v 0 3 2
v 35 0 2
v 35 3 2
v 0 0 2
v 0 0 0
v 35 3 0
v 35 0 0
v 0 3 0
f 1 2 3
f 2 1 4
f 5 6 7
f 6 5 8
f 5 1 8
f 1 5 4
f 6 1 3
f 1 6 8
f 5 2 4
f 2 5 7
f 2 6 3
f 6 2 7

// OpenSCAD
translate([2.5, 1.5, 1.0]) color([0.4049341374504143, 0.7837985890347726, 0.30331272607892745]) cube([5, 3, 2], center=true);
translate([7.5, 1.5, 1.0]) color([0.4765969541523558, 0.5833820394550312, 0.9081128851953352]) cube([5, 3, 2], center=true);
translate([12.5, 1.5, 1.0]) color([0.5046868558173903, 0.28183784439970383, 0.7558042041572239]) cube([5, 3, 2], center=true);
translate([17.5, 1.5, 1.0]) color([0.6183689966753316, 0.25050634136244054, 0.9097462559682401]) cube([5, 3, 2], center=true);
translate([22.5, 1.5, 1.0]) color([0.9827854760376531, 0.8102172359965896, 0.9021659504395827]) cube([5, 3, 2], center=true);
translate([27.5, 1.5, 1.0]) color([0.3101475693193326, 0.7298317482601286, 0.8988382879679935]) cube([5, 3, 2], center=true);
translate([32.5, 1.5, 1.0]) color([0.6839839319154413, 0.47214271545271336, 0.1007012080683658]) cube([5, 3, 2], center=true);
